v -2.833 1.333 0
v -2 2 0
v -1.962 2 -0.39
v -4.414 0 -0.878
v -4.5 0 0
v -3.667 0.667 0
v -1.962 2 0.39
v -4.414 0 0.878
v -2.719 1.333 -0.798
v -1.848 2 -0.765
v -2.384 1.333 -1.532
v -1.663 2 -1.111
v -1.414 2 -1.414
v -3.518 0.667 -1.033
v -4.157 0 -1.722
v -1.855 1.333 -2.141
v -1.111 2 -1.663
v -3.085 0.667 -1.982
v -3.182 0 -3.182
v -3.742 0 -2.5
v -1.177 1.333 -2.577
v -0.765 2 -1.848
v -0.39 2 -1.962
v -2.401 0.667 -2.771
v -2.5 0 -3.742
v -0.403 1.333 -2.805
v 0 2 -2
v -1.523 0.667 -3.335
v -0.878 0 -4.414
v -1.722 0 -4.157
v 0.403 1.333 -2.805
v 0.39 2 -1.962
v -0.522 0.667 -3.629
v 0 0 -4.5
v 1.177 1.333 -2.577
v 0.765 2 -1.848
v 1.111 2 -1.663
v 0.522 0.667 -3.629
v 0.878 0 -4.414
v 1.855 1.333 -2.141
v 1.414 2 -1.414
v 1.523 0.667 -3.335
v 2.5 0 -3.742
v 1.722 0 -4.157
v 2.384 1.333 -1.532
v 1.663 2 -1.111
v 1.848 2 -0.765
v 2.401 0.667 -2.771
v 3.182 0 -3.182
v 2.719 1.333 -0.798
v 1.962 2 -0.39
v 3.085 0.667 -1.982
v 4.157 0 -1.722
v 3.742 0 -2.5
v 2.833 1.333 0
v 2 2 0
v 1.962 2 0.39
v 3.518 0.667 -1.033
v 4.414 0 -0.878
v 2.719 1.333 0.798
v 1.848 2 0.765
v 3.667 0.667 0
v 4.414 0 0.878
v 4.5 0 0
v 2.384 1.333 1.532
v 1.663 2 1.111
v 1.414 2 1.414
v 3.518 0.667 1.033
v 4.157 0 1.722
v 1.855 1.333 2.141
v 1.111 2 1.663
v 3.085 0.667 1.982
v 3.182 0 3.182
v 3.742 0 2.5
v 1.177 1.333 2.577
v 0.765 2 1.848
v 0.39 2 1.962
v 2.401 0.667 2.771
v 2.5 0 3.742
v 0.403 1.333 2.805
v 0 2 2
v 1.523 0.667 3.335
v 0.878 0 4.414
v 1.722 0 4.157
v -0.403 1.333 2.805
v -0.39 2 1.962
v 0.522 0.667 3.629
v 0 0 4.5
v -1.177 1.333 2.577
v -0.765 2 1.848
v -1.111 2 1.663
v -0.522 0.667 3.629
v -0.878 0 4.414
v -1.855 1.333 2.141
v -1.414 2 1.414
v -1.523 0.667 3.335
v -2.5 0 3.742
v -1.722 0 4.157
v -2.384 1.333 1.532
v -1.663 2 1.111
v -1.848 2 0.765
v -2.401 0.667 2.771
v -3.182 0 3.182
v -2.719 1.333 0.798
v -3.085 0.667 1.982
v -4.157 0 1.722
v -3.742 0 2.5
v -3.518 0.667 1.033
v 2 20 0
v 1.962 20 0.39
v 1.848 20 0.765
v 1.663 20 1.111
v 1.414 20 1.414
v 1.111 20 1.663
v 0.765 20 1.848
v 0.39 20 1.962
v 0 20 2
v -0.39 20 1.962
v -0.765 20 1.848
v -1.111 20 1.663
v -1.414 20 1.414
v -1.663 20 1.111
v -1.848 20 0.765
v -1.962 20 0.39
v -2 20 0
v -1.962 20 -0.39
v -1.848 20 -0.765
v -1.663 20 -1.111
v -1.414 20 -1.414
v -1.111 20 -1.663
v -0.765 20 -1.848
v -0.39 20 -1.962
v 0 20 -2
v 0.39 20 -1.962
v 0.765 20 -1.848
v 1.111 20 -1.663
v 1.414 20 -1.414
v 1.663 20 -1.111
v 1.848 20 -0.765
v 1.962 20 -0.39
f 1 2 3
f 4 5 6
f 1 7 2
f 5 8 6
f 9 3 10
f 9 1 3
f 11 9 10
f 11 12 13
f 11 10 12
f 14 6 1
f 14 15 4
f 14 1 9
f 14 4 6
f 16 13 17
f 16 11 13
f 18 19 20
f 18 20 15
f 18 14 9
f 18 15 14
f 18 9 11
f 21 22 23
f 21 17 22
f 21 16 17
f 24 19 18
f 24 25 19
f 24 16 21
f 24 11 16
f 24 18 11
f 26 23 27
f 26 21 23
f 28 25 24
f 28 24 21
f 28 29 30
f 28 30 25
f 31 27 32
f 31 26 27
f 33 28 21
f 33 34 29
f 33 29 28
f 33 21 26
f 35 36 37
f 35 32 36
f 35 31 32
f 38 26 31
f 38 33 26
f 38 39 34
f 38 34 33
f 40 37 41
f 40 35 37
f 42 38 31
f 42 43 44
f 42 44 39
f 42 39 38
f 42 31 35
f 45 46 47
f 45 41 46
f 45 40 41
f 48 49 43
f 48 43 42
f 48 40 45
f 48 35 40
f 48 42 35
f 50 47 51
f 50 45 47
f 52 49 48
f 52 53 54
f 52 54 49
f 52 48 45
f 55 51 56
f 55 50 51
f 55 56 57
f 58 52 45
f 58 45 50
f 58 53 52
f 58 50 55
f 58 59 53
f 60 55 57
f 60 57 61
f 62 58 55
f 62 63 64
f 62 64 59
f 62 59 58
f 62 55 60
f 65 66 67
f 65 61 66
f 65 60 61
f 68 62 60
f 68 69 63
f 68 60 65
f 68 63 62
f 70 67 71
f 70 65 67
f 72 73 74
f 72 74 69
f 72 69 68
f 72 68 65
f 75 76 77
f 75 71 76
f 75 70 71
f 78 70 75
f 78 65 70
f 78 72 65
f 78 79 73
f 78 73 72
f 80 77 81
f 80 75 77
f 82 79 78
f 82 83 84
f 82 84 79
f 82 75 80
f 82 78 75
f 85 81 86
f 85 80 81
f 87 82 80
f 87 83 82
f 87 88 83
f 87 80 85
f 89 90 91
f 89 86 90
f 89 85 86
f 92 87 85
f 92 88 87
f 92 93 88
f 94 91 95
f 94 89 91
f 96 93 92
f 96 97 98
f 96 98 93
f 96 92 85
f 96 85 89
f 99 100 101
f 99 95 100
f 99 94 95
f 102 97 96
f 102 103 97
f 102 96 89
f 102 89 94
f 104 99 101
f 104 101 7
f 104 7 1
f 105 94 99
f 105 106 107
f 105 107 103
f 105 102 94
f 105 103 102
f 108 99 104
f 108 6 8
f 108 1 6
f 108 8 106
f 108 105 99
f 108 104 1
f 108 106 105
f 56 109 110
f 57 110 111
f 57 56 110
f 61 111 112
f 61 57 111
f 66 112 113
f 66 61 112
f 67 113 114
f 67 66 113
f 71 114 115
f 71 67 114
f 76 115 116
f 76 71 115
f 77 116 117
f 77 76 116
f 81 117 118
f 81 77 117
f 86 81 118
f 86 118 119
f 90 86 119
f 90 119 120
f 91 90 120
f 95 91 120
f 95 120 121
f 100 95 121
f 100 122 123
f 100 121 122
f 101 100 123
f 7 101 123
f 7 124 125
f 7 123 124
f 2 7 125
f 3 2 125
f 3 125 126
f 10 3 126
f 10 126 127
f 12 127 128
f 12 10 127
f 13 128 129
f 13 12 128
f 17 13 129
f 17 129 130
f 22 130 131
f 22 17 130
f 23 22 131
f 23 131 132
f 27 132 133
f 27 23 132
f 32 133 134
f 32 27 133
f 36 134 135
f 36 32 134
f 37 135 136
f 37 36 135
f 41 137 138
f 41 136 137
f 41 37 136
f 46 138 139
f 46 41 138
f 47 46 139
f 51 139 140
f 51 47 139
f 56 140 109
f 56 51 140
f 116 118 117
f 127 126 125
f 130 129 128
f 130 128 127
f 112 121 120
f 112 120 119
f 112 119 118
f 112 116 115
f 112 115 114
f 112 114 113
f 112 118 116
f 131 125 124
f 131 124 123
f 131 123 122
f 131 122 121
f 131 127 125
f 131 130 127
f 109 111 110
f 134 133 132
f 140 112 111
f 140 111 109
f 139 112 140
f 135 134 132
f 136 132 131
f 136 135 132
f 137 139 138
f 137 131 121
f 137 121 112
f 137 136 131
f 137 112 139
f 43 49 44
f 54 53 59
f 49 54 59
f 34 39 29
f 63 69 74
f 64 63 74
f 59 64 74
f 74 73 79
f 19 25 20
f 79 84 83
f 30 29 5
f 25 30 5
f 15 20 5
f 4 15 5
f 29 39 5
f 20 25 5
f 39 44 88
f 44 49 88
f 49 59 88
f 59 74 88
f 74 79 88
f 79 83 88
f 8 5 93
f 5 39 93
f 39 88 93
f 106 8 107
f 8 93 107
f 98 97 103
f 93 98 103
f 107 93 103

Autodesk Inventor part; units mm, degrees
ref_plane "YZ Plane" through (0, 0, 0) normal (1, 0, 0) x (0, 1, 0)
ref_plane "XZ Plane" through (0, 0, 0) normal (0, 1, 0) x (-1, 0, 0)
ref_plane "XY Plane" through (0, 0, 0) normal (0, 0, 1) x (1, 0, 0)
sketch "Sketch1" plane through (0, 0, 0) normal (0, 1, 0) x (-1, 0, 0)
  circle A0 centre (0, 0) radius 4.5
  dimension "d0" = 9
extrude "Extrusion1" add sketch "Sketch1" along normal blind 2
chamfer "Chamfer1" distance 2.5 distance2 2 1 edges at (4.5, 2, 0) measured on face at (-0.1808, 2, 1.316)
sketch "Sketch2" plane through (0, 2, 0) normal (0, 1, 0) x (1, 0, 0)
  circle A0 centre (0, 0) radius 2 projected
extrude "Extrusion2" add sketch "Sketch2" along normal blind 18
properties part number "pulley screw"
